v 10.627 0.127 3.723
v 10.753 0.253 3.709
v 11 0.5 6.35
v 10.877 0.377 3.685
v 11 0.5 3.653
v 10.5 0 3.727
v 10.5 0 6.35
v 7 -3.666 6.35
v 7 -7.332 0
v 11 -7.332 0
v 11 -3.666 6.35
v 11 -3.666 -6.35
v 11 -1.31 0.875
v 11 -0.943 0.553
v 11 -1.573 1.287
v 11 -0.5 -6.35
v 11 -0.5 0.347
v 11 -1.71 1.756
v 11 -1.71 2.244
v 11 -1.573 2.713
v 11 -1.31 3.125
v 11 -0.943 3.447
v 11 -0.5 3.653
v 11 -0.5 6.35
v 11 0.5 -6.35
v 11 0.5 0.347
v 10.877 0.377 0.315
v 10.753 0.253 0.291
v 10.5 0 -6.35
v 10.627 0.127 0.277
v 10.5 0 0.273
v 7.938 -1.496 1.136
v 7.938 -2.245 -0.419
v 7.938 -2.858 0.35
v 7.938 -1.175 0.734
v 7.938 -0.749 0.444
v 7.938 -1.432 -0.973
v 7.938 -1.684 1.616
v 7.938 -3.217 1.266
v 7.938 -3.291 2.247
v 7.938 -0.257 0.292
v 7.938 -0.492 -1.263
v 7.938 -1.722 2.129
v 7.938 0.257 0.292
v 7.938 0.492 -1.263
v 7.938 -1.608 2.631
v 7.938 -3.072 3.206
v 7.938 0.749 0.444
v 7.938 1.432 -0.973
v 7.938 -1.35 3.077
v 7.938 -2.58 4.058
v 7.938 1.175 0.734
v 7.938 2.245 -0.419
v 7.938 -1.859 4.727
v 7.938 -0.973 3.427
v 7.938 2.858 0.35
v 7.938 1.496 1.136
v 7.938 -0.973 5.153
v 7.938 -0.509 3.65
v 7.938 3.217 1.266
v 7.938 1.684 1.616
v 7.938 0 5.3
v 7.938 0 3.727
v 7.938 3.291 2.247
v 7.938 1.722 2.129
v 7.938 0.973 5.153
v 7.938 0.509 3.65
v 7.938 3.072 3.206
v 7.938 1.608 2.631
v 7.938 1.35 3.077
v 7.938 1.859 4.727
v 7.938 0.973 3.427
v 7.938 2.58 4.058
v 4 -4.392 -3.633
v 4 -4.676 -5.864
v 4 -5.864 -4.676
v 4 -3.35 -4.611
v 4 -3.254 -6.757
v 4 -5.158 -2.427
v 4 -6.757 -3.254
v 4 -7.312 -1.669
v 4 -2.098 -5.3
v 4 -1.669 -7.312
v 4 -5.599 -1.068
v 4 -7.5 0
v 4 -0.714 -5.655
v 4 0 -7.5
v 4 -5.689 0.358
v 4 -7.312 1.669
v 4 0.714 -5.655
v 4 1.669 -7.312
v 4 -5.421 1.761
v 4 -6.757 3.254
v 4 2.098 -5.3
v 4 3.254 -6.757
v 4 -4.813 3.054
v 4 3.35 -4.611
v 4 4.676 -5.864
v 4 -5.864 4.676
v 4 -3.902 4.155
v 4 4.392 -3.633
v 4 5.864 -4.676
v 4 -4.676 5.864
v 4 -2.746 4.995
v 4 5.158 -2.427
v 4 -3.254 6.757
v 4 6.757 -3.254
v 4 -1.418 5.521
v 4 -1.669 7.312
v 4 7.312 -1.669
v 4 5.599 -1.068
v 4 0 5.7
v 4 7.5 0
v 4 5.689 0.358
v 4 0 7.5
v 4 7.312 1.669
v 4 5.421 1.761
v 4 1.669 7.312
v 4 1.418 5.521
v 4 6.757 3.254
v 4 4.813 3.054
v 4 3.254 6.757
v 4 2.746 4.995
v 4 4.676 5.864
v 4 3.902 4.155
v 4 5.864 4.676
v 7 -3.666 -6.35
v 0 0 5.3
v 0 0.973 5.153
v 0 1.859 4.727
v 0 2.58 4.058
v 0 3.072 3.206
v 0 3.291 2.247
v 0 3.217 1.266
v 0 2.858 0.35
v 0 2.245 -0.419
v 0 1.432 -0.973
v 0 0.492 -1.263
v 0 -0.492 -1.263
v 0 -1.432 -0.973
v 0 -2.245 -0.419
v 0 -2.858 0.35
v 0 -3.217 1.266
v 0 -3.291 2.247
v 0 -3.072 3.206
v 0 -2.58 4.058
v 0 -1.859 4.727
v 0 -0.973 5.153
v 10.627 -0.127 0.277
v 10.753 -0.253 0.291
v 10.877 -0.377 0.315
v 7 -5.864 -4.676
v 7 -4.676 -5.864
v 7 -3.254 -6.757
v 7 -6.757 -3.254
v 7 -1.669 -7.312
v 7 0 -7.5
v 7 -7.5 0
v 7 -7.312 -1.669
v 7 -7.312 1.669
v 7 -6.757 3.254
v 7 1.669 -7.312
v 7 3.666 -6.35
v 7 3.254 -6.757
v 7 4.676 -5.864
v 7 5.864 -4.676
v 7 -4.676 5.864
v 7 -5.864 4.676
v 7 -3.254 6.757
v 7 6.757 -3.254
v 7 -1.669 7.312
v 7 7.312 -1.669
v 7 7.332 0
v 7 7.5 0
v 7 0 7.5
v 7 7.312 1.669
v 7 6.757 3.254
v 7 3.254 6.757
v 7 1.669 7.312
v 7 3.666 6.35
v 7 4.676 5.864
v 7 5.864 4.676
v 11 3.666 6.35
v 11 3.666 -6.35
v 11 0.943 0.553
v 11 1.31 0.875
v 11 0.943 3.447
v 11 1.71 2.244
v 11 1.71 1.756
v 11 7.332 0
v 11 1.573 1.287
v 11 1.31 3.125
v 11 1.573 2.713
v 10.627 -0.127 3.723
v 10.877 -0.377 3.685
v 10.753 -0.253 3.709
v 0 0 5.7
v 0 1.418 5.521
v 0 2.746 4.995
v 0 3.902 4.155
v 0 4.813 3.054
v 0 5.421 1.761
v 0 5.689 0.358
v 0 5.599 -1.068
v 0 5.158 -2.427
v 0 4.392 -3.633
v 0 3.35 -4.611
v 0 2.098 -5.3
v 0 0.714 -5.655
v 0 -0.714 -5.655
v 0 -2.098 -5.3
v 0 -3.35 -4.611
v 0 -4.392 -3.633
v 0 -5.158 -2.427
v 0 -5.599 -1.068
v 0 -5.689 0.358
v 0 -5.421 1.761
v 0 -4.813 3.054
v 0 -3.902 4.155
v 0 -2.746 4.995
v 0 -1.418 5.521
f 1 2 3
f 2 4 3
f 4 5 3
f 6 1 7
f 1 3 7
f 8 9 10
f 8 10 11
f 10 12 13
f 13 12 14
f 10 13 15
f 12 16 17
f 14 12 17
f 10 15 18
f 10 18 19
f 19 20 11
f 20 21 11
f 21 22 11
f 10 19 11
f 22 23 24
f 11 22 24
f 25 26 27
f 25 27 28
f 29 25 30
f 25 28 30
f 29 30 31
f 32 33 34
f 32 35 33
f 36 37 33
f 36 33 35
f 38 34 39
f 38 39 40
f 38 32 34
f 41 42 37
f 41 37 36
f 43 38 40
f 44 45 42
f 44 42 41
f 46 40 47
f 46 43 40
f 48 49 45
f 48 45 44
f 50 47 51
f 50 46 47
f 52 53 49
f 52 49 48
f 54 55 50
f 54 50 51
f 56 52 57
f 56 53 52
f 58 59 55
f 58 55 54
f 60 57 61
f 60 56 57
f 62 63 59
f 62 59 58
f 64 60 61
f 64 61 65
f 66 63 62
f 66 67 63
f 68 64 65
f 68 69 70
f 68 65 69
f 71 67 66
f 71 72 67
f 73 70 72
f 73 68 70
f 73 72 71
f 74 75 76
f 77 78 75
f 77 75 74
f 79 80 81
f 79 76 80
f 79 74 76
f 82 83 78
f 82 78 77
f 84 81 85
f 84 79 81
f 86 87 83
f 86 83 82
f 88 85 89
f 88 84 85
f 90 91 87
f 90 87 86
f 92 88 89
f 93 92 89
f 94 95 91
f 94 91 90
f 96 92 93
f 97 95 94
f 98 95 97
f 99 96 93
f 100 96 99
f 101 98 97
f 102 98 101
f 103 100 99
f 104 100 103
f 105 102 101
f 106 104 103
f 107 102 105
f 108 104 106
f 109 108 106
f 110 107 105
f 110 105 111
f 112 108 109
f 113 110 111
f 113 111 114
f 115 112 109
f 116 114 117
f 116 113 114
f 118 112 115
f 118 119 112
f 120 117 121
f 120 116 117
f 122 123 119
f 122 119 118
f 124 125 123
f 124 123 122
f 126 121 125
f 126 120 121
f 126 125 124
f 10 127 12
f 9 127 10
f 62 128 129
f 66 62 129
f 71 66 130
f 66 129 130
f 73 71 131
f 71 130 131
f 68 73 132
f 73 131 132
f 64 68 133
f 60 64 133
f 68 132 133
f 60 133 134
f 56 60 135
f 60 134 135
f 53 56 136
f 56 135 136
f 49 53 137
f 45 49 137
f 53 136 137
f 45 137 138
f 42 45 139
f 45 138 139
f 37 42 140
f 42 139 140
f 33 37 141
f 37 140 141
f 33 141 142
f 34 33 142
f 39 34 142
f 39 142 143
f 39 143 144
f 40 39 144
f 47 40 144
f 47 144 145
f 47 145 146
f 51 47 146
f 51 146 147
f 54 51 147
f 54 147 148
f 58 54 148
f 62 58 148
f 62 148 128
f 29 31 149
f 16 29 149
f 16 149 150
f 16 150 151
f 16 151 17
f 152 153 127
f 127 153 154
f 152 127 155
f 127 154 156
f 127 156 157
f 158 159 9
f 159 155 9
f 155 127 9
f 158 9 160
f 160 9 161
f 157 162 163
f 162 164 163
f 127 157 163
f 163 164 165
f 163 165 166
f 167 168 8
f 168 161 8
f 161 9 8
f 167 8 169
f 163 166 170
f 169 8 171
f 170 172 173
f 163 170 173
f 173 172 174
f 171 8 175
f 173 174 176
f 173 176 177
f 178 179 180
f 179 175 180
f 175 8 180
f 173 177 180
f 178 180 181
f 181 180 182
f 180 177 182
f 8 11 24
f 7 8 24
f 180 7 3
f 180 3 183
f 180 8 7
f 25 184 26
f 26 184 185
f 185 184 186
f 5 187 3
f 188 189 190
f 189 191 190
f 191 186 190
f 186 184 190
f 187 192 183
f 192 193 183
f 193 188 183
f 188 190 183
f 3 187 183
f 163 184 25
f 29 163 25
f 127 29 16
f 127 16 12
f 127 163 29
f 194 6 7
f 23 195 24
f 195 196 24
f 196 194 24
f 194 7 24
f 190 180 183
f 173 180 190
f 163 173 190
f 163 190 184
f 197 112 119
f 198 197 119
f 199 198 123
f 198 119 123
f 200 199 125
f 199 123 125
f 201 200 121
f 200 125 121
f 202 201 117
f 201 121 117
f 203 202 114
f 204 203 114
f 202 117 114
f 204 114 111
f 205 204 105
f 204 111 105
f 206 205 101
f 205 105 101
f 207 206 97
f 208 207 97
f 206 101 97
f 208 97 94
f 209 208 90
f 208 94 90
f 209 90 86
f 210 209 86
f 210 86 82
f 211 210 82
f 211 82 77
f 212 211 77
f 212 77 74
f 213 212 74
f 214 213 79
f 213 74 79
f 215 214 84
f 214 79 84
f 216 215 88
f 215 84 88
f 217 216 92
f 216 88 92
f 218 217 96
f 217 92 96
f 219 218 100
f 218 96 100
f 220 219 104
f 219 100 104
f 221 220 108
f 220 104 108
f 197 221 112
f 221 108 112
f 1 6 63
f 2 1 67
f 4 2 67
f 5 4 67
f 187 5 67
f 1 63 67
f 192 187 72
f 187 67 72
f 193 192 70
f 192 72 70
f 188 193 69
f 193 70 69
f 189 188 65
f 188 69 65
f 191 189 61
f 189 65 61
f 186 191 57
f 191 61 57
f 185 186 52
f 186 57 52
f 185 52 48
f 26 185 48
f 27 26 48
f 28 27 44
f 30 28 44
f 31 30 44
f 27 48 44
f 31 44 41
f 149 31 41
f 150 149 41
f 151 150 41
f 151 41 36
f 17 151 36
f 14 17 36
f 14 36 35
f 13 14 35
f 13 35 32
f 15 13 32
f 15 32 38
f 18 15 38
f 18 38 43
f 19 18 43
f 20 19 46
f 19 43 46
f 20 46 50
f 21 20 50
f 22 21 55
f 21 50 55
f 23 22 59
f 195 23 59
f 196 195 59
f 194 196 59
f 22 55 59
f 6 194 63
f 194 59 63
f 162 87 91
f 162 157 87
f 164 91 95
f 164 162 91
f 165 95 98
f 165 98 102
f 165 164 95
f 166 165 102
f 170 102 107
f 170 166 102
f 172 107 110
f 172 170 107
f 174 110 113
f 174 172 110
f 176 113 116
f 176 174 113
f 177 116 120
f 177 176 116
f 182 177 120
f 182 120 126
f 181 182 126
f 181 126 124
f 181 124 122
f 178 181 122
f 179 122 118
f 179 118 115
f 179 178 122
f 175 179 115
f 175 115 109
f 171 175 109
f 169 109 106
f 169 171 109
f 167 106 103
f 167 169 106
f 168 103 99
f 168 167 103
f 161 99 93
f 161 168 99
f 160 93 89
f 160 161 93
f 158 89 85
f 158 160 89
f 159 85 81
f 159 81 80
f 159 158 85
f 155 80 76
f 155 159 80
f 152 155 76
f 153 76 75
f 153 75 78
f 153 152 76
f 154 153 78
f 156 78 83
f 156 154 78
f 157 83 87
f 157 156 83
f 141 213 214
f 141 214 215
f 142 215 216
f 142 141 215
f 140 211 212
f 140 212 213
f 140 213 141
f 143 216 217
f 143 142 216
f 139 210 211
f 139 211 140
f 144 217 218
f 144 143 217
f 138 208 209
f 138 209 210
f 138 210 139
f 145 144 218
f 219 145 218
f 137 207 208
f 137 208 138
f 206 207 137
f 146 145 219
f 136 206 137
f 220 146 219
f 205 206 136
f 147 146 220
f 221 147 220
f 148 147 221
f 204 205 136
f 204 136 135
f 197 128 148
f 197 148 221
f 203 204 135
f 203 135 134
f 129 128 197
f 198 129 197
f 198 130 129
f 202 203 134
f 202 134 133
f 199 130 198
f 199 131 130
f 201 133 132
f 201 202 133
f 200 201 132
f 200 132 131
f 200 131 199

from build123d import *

# Parameters (mm, degrees)
SKETCH1_W                                      = 3
SKETCH1_H                                      = 7.5
BOSS_EXTRUDE1_DEPTH                            = 4
CUT_EXTRUDE1_DEPTH                             = 14.85
SKETCH4_R                                      = 5.7
BOSS_EXTRUDE2_DEPTH                            = 4
CBORE_FOR_5_BUTTON_HEAD_CAP_SCREW1_D           = 1.5875
CBORE_FOR_5_BUTTON_HEAD_CAP_SCREW1_CBORE_D     = 6.600000008
CBORE_FOR_5_BUTTON_HEAD_CAP_SCREW1_CBORE_DEPTH = 7.9375
F_8_32_TAPPED_HOLE1_D                          = 3.4544


with BuildPart() as part:
    # Sketch1 → Revolve1 (revolve)
    with BuildSketch(Plane.XY, mode=Mode.PRIVATE) as revolve1_sk:
        with Locations((5.5, 3.75)):
            Rectangle(SKETCH1_W, SKETCH1_H)
    revolve(revolve1_sk.sketch.rotate(Axis((4, 0, 0), (1, 0, 0)), 270), axis=Axis((4, 0, 0), (1, 0, 0)))  # turned: the seam where the file's is

    # Sketch2 → Boss-Extrude1 (add)
    with BuildSketch(Plane(origin=(7, 0, 0), x_dir=(0, 0, -1), z_dir=(1, 0, 0))):
        Polygon((0, -7.332348419), (-6.35, -3.666174209), (-6.35, 3.666174209), (0, 7.332348419), (6.35, 3.666174209), (6.35, -3.666174209), align=None)
    extrude(amount=BOSS_EXTRUDE1_DEPTH)

    # Sketch3 → Cut-Extrude1 (cut, through all)
    with BuildSketch(Plane.XY.offset(6.35)):
        Polygon((11, -0.5), (11, 0.5), (10.5, 0), align=None)
    extrude(amount=-CUT_EXTRUDE1_DEPTH, mode=Mode.SUBTRACT)

    # Sketch4 → Boss-Extrude2 (add)
    with BuildSketch(Plane.ZY.offset(-4)):
        Circle(SKETCH4_R)
    extrude(amount=BOSS_EXTRUDE2_DEPTH)

    # CBORE for #5 Button Head Cap Screw1 (through all)
    with Locations(Plane.ZY):
        with Locations((2, 0)):
            CounterBoreHole(CBORE_FOR_5_BUTTON_HEAD_CAP_SCREW1_D / 2, CBORE_FOR_5_BUTTON_HEAD_CAP_SCREW1_CBORE_D / 2, CBORE_FOR_5_BUTTON_HEAD_CAP_SCREW1_CBORE_DEPTH)

    # #8-32 Tapped Hole1 (through all)
    with Locations(Plane(origin=(11, 0, 0), x_dir=(0, 0, -1), z_dir=(1, 0, 0))):
        with Locations((-2, 0)):
            Hole(F_8_32_TAPPED_HOLE1_D / 2)


solid = part.part
